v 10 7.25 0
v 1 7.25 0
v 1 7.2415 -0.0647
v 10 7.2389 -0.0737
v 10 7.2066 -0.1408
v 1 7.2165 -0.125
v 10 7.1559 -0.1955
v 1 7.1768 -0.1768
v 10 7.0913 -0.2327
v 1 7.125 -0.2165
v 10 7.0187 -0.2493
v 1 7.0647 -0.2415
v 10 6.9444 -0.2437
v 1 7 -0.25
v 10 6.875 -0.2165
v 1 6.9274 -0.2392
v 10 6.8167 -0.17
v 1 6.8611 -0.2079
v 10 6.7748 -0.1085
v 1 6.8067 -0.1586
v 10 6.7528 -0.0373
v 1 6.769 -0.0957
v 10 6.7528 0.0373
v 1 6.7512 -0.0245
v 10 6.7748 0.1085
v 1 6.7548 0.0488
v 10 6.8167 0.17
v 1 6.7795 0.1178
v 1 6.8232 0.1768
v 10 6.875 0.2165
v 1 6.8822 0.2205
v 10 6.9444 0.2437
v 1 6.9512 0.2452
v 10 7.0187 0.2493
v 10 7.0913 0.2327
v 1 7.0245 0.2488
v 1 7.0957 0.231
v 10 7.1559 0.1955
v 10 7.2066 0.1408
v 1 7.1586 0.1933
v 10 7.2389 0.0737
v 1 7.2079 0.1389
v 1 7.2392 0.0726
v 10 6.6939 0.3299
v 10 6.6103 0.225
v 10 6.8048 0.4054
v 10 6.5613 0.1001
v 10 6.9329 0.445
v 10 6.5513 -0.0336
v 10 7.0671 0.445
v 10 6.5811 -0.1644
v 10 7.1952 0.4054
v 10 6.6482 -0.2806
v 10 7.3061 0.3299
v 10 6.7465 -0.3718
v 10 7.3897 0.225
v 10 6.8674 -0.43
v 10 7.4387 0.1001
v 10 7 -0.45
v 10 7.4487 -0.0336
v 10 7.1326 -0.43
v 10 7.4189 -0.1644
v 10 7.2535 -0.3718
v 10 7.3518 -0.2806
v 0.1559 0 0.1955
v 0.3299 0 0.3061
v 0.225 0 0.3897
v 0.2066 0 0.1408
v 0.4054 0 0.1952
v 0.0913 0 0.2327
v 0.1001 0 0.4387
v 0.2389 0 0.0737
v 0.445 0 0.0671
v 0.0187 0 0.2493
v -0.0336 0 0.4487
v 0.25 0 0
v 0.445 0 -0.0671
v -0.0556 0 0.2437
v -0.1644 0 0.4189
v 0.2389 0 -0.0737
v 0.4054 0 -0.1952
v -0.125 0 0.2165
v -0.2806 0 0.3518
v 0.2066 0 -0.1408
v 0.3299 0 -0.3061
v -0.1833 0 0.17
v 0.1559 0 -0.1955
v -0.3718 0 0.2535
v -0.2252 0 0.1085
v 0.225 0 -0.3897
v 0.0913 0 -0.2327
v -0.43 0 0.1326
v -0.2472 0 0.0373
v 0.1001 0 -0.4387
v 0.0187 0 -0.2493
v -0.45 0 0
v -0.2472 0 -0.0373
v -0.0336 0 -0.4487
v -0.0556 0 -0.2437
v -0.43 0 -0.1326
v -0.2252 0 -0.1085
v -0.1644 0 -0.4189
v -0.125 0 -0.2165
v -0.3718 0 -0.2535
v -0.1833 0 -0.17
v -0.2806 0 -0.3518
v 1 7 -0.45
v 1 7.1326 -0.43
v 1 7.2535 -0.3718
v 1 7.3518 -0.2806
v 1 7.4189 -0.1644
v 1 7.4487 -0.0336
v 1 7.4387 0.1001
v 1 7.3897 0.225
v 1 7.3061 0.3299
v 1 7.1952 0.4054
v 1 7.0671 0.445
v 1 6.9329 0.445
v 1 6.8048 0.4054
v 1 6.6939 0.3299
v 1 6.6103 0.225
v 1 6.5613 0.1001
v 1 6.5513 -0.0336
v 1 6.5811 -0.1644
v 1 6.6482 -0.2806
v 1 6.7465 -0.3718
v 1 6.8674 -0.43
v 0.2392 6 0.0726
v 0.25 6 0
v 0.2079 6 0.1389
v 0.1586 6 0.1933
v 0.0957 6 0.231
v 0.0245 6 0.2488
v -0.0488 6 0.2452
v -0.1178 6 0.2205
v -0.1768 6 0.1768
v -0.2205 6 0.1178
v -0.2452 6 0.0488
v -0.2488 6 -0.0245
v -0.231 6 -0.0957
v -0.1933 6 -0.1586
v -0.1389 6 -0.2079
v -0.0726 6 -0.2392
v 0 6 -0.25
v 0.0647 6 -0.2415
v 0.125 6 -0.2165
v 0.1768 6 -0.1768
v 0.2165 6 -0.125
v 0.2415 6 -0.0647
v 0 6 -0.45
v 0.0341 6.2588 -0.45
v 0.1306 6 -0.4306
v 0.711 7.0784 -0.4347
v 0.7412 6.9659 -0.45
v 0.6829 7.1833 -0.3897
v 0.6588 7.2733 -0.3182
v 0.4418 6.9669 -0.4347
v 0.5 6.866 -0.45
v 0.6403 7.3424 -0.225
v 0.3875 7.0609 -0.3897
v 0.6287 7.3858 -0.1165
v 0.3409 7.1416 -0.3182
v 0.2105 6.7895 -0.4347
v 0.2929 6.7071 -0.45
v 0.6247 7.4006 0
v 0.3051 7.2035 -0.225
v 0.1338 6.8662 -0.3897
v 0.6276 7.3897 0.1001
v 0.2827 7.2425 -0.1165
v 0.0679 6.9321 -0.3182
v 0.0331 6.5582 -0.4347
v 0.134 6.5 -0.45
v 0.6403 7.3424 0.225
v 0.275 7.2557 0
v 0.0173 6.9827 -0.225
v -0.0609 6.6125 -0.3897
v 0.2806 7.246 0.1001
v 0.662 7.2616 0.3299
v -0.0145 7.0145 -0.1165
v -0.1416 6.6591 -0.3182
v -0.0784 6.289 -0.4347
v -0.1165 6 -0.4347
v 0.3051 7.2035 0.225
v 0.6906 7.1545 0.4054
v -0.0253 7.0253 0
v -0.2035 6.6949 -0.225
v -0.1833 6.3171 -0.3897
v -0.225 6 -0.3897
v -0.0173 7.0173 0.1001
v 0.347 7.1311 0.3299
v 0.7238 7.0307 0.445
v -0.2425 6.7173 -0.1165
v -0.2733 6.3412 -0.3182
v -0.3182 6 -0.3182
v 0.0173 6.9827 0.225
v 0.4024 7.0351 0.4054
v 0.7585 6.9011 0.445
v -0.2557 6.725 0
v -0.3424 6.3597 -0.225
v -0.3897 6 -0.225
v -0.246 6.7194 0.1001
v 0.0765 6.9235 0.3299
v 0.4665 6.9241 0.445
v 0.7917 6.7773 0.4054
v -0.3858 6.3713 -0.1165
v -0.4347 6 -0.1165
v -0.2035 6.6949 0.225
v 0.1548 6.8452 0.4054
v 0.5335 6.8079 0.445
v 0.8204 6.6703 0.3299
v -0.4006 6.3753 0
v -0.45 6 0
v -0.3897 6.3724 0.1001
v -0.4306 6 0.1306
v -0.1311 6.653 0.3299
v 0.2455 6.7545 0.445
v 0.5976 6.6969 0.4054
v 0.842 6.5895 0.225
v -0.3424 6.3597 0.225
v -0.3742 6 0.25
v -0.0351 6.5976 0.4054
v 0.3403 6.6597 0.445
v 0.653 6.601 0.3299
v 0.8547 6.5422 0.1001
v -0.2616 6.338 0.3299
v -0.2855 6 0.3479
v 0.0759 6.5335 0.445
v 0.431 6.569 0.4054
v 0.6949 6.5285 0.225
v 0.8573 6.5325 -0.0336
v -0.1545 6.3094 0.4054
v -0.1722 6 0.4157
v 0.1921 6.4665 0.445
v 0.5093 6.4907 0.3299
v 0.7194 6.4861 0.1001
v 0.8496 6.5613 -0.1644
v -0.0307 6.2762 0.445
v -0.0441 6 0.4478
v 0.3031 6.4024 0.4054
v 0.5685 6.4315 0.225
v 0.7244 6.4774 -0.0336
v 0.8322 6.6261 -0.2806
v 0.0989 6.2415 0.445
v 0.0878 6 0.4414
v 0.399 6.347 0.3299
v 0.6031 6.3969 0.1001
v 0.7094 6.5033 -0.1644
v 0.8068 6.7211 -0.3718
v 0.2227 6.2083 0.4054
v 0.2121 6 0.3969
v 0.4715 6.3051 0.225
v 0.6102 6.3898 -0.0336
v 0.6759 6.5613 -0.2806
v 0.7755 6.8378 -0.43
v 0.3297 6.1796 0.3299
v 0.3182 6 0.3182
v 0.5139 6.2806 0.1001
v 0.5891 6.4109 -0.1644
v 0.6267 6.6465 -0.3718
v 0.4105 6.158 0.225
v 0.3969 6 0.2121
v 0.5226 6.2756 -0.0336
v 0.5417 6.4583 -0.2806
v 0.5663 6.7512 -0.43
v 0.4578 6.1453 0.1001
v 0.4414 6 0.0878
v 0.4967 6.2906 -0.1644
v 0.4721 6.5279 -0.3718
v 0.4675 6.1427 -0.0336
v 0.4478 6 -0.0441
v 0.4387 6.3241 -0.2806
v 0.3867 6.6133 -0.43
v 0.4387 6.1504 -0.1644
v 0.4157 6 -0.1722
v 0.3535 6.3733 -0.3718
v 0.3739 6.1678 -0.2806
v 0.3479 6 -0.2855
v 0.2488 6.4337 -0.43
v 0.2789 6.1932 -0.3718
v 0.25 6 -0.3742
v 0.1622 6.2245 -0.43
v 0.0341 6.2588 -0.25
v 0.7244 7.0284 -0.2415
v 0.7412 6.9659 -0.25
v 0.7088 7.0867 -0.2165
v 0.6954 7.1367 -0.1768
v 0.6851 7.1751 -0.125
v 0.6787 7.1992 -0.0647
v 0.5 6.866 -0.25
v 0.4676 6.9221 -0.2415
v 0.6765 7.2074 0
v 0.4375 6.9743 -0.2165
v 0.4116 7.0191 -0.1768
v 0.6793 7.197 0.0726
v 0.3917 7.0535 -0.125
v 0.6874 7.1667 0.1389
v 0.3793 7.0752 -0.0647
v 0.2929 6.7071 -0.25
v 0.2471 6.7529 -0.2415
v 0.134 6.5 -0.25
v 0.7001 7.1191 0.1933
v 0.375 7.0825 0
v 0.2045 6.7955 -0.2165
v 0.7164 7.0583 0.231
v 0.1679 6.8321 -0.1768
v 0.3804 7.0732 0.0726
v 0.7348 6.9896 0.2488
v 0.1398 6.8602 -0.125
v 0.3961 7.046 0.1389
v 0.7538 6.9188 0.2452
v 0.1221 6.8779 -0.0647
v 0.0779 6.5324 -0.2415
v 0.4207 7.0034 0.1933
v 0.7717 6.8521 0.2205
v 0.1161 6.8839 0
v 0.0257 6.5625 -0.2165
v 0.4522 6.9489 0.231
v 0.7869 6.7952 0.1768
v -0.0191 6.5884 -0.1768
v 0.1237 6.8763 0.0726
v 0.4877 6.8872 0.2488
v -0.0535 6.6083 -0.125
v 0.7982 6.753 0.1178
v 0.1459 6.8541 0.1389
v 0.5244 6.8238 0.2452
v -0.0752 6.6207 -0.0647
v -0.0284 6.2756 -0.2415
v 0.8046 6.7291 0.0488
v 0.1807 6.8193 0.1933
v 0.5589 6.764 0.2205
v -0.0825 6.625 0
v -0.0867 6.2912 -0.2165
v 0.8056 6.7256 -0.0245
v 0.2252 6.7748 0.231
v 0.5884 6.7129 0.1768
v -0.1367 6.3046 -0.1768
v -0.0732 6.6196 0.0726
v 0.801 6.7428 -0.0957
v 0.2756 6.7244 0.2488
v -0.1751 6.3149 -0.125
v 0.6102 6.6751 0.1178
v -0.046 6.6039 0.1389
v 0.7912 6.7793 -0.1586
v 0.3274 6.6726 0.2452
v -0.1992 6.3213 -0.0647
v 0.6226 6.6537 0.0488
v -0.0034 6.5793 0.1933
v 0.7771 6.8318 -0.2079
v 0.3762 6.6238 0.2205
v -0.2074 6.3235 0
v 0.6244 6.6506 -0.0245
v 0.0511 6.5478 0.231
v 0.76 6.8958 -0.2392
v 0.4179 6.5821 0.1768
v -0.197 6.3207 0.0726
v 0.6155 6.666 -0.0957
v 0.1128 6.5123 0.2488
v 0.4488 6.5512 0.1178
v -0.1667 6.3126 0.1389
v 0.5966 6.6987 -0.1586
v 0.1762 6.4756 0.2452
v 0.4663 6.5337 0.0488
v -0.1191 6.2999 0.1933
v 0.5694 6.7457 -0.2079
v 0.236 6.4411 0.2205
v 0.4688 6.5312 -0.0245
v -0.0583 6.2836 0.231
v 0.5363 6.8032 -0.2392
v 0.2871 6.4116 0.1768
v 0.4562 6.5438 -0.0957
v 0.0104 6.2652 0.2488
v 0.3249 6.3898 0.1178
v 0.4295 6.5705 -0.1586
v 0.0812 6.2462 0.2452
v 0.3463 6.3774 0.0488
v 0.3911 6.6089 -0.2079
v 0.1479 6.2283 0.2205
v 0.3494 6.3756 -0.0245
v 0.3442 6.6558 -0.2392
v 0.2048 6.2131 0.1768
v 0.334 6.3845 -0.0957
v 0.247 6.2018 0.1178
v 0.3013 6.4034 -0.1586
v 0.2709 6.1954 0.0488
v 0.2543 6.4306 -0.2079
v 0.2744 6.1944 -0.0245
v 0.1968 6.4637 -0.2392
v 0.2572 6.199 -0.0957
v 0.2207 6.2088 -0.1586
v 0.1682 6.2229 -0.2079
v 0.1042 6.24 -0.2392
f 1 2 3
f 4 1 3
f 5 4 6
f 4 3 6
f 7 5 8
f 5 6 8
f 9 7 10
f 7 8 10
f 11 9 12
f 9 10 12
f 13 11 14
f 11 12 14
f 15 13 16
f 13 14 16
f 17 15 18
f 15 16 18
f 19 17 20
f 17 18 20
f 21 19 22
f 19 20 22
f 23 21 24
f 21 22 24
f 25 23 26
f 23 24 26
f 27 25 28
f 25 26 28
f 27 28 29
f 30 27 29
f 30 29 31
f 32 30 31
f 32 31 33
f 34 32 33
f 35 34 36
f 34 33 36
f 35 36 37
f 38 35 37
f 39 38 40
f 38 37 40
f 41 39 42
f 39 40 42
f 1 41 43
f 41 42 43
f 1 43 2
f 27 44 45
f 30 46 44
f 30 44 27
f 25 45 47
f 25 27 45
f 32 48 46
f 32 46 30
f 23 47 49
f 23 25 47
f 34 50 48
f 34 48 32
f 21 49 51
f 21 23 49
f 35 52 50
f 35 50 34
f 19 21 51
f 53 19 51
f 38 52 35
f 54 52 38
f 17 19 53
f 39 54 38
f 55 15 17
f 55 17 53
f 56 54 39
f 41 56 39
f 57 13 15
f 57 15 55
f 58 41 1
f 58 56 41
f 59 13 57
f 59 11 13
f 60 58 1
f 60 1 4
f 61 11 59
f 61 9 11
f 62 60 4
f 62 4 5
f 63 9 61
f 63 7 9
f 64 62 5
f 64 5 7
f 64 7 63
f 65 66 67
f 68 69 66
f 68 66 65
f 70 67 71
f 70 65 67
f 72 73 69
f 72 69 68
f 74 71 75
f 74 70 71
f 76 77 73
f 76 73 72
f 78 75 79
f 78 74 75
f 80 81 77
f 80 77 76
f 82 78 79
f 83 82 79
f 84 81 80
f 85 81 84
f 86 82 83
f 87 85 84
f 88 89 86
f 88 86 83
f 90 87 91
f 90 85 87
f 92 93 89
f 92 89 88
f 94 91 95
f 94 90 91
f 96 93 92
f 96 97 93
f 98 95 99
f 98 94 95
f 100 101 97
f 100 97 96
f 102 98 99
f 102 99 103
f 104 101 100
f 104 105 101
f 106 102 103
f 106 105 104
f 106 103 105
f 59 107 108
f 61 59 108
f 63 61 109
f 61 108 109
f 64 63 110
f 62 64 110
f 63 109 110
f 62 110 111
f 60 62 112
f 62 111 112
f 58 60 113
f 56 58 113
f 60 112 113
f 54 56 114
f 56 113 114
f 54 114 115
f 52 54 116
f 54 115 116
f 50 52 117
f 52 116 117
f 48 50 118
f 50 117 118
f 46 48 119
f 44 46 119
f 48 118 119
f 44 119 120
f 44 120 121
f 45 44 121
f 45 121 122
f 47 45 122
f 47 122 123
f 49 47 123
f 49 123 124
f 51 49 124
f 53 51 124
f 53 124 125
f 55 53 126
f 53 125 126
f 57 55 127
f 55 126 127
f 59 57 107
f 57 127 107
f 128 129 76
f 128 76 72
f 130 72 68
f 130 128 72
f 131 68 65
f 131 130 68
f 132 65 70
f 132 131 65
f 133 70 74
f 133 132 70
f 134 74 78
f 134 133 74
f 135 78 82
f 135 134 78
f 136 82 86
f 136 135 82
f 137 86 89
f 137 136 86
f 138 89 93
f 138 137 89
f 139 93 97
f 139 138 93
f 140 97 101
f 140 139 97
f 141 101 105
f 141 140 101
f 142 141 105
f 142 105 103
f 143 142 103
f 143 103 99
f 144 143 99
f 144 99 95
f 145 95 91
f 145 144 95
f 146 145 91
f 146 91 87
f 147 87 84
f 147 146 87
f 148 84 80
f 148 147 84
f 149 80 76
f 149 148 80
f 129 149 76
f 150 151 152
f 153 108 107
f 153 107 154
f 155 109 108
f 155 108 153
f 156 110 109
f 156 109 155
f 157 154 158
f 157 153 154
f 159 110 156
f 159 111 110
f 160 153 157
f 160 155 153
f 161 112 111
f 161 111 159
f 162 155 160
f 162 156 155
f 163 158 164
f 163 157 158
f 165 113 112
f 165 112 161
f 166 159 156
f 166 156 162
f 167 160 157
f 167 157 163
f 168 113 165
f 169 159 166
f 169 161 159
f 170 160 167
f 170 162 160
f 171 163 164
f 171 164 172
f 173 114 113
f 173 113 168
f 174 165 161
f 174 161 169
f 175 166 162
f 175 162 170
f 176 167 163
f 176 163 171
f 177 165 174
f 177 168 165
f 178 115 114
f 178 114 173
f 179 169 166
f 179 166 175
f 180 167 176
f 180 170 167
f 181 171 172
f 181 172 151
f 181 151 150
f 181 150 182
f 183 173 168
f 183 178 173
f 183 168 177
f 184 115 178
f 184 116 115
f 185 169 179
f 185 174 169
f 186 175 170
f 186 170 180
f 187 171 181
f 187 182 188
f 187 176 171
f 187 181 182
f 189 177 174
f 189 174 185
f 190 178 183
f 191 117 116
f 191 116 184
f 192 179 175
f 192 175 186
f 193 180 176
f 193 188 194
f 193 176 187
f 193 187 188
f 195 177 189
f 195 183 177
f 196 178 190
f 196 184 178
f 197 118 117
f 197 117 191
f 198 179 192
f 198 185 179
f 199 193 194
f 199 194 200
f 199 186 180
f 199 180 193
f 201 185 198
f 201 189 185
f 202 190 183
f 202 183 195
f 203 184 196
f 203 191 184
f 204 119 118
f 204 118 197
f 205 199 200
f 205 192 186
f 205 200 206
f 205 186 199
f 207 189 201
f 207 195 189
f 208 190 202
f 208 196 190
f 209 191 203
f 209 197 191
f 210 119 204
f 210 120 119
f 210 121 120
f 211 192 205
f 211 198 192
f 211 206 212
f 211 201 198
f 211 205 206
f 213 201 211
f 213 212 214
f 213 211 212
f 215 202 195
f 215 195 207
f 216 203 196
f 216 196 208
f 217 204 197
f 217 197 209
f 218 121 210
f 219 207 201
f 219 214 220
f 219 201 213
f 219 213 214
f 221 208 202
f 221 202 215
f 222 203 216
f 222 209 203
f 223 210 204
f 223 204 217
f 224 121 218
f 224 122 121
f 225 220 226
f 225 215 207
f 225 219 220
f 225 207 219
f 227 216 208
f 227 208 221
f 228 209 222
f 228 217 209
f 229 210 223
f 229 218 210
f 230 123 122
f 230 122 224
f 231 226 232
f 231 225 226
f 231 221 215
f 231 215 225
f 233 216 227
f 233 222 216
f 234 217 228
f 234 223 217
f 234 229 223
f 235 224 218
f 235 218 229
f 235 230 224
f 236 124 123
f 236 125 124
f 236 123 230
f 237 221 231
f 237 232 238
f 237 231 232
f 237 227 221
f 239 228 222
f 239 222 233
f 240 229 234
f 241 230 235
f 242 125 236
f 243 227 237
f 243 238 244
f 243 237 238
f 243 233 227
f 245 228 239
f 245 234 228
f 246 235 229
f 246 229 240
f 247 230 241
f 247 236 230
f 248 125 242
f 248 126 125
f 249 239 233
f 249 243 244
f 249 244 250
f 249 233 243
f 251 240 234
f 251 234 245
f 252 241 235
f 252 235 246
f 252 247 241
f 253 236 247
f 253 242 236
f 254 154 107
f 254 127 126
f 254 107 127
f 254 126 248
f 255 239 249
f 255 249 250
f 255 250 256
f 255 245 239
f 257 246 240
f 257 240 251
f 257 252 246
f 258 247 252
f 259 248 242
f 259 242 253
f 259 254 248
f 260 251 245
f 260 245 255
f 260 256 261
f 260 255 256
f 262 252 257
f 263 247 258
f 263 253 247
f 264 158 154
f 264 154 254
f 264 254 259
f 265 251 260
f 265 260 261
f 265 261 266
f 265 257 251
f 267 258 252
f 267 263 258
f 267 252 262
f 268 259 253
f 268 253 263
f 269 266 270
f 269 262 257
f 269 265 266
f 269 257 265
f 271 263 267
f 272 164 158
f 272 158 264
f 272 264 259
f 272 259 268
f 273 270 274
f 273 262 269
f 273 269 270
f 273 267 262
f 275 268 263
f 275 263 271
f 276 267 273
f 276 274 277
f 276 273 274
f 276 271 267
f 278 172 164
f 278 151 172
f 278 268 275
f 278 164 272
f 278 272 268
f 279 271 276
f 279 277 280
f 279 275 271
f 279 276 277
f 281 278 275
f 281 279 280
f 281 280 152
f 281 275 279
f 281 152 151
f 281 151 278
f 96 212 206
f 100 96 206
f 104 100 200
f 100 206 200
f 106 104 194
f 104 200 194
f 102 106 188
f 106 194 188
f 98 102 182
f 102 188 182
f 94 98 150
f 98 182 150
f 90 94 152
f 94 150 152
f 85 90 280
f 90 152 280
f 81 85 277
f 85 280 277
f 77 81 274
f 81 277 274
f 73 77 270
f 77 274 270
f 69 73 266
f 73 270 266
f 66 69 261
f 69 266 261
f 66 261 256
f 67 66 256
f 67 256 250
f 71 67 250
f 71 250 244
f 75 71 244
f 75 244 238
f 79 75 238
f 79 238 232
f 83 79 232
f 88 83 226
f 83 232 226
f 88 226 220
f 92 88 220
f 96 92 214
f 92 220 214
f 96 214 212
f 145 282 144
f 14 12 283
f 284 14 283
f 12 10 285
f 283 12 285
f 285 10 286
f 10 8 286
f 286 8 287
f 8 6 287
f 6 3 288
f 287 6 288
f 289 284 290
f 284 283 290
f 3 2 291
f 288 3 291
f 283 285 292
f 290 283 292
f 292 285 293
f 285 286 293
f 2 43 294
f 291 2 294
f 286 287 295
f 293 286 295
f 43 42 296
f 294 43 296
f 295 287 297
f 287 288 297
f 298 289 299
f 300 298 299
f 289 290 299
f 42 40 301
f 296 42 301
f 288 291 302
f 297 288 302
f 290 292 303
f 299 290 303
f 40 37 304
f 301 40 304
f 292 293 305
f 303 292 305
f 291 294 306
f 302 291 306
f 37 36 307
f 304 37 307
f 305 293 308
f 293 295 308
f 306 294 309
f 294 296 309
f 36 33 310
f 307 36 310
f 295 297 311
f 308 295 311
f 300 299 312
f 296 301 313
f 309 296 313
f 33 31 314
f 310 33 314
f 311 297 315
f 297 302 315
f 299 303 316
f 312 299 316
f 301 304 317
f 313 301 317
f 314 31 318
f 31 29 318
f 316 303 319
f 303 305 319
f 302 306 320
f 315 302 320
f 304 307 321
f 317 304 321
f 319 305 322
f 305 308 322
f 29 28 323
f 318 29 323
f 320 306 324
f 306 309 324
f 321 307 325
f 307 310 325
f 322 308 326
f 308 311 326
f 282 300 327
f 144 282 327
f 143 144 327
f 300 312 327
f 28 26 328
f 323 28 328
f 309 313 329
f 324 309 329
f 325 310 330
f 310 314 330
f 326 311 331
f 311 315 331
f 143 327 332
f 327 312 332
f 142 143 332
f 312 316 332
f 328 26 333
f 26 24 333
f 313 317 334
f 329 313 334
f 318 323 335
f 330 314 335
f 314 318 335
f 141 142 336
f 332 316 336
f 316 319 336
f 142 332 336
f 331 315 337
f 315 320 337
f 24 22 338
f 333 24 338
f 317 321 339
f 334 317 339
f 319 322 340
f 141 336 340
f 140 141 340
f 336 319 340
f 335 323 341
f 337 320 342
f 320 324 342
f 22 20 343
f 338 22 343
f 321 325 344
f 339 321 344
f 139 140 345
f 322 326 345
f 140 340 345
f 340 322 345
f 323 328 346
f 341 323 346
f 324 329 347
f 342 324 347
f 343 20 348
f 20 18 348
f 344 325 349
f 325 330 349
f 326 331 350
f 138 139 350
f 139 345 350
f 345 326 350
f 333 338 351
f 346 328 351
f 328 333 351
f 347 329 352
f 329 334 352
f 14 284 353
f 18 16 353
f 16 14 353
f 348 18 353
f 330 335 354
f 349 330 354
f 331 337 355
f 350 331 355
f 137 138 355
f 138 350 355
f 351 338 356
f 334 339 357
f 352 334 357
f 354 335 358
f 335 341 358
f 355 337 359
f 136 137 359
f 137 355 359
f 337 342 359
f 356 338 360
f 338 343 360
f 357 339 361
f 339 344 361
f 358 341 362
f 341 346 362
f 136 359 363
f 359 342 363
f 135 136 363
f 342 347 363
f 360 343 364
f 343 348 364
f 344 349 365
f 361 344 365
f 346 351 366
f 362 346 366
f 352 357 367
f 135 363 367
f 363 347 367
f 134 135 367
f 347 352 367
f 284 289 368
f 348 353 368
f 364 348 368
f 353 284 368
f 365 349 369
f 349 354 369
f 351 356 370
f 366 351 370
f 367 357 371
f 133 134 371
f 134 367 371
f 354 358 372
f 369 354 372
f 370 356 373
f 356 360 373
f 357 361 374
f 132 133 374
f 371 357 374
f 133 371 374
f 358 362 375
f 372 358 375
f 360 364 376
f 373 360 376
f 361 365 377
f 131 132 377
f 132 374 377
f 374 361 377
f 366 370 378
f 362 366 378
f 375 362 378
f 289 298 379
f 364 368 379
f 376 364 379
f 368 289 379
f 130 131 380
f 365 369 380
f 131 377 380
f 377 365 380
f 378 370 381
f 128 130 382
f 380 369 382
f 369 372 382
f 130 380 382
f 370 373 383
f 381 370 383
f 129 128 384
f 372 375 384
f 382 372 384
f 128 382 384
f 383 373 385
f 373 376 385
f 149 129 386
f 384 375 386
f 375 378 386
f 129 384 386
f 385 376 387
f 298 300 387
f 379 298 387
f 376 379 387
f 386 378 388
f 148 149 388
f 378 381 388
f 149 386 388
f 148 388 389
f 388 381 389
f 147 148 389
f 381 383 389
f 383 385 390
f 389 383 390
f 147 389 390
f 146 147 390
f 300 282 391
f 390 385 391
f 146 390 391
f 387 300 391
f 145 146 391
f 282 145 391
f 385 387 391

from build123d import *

# Parameters (mm, degrees)
SKETCH1_R           = 0.45
SKETCH1_R_2         = 0.25
REVOLVE1_ANGLE      = 90
SKETCH6_R           = 0.45
BOSS_EXTRUDE1_DEPTH = 6
SKETCH11_R          = 0.45
BOSS_EXTRUDE2_DEPTH = 9
SKETCH17_W          = 9
SKETCH17_H          = 0.25
SKETCH19_W          = 0.25
SKETCH19_H          = 6


with BuildPart() as part:
    # Sketch1 → Revolve1 (revolve)
    with BuildSketch(Plane(origin=(1, 0, 0), x_dir=(0, 0, -1), z_dir=(1, 0, 0))):
        with Locations((0, 7)):
            Circle(SKETCH1_R)
        with Locations((0, 7)):
            Circle(SKETCH1_R_2, mode=Mode.SUBTRACT)
    revolve(axis=Axis((1, 6, 0.4), (0, 0, 1)), revolution_arc=REVOLVE1_ANGLE)

    # Sketch6 → Boss-Extrude1 (add)
    with BuildSketch(Plane(origin=(0, 6, 0), x_dir=(-1, 0, 0), z_dir=(0, -1, 0))):
        Circle(SKETCH6_R)
    extrude(amount=BOSS_EXTRUDE1_DEPTH)

    # Sketch11 → Boss-Extrude2 (add)
    with BuildSketch(Plane(origin=(1, 0, 0), x_dir=(0, 0, -1), z_dir=(1, 0, 0))):
        with Locations((0, 7)):
            Circle(SKETCH11_R)
    extrude(amount=BOSS_EXTRUDE2_DEPTH)

    # Sketch17 → Cut-Revolve1 (revolve, cut)
    with BuildSketch(Plane(origin=(0, 0, 0), x_dir=(-1, 0, 0), z_dir=(0, 0, -1))):
        with Locations((-5.5, 7.125)):
            Rectangle(SKETCH17_W, SKETCH17_H)
    revolve(axis=Axis((10, 7, 0), (-1, 0, 0)), mode=Mode.SUBTRACT)

    # Sketch19 → Cut-Revolve2 (revolve, cut)
    with BuildSketch(Plane.XY):
        with Locations((0.125, 3)):
            Rectangle(SKETCH19_W, SKETCH19_H)
    revolve(axis=Axis((0, 6, 0), (0, -1, 0)), mode=Mode.SUBTRACT)


solid = part.part
